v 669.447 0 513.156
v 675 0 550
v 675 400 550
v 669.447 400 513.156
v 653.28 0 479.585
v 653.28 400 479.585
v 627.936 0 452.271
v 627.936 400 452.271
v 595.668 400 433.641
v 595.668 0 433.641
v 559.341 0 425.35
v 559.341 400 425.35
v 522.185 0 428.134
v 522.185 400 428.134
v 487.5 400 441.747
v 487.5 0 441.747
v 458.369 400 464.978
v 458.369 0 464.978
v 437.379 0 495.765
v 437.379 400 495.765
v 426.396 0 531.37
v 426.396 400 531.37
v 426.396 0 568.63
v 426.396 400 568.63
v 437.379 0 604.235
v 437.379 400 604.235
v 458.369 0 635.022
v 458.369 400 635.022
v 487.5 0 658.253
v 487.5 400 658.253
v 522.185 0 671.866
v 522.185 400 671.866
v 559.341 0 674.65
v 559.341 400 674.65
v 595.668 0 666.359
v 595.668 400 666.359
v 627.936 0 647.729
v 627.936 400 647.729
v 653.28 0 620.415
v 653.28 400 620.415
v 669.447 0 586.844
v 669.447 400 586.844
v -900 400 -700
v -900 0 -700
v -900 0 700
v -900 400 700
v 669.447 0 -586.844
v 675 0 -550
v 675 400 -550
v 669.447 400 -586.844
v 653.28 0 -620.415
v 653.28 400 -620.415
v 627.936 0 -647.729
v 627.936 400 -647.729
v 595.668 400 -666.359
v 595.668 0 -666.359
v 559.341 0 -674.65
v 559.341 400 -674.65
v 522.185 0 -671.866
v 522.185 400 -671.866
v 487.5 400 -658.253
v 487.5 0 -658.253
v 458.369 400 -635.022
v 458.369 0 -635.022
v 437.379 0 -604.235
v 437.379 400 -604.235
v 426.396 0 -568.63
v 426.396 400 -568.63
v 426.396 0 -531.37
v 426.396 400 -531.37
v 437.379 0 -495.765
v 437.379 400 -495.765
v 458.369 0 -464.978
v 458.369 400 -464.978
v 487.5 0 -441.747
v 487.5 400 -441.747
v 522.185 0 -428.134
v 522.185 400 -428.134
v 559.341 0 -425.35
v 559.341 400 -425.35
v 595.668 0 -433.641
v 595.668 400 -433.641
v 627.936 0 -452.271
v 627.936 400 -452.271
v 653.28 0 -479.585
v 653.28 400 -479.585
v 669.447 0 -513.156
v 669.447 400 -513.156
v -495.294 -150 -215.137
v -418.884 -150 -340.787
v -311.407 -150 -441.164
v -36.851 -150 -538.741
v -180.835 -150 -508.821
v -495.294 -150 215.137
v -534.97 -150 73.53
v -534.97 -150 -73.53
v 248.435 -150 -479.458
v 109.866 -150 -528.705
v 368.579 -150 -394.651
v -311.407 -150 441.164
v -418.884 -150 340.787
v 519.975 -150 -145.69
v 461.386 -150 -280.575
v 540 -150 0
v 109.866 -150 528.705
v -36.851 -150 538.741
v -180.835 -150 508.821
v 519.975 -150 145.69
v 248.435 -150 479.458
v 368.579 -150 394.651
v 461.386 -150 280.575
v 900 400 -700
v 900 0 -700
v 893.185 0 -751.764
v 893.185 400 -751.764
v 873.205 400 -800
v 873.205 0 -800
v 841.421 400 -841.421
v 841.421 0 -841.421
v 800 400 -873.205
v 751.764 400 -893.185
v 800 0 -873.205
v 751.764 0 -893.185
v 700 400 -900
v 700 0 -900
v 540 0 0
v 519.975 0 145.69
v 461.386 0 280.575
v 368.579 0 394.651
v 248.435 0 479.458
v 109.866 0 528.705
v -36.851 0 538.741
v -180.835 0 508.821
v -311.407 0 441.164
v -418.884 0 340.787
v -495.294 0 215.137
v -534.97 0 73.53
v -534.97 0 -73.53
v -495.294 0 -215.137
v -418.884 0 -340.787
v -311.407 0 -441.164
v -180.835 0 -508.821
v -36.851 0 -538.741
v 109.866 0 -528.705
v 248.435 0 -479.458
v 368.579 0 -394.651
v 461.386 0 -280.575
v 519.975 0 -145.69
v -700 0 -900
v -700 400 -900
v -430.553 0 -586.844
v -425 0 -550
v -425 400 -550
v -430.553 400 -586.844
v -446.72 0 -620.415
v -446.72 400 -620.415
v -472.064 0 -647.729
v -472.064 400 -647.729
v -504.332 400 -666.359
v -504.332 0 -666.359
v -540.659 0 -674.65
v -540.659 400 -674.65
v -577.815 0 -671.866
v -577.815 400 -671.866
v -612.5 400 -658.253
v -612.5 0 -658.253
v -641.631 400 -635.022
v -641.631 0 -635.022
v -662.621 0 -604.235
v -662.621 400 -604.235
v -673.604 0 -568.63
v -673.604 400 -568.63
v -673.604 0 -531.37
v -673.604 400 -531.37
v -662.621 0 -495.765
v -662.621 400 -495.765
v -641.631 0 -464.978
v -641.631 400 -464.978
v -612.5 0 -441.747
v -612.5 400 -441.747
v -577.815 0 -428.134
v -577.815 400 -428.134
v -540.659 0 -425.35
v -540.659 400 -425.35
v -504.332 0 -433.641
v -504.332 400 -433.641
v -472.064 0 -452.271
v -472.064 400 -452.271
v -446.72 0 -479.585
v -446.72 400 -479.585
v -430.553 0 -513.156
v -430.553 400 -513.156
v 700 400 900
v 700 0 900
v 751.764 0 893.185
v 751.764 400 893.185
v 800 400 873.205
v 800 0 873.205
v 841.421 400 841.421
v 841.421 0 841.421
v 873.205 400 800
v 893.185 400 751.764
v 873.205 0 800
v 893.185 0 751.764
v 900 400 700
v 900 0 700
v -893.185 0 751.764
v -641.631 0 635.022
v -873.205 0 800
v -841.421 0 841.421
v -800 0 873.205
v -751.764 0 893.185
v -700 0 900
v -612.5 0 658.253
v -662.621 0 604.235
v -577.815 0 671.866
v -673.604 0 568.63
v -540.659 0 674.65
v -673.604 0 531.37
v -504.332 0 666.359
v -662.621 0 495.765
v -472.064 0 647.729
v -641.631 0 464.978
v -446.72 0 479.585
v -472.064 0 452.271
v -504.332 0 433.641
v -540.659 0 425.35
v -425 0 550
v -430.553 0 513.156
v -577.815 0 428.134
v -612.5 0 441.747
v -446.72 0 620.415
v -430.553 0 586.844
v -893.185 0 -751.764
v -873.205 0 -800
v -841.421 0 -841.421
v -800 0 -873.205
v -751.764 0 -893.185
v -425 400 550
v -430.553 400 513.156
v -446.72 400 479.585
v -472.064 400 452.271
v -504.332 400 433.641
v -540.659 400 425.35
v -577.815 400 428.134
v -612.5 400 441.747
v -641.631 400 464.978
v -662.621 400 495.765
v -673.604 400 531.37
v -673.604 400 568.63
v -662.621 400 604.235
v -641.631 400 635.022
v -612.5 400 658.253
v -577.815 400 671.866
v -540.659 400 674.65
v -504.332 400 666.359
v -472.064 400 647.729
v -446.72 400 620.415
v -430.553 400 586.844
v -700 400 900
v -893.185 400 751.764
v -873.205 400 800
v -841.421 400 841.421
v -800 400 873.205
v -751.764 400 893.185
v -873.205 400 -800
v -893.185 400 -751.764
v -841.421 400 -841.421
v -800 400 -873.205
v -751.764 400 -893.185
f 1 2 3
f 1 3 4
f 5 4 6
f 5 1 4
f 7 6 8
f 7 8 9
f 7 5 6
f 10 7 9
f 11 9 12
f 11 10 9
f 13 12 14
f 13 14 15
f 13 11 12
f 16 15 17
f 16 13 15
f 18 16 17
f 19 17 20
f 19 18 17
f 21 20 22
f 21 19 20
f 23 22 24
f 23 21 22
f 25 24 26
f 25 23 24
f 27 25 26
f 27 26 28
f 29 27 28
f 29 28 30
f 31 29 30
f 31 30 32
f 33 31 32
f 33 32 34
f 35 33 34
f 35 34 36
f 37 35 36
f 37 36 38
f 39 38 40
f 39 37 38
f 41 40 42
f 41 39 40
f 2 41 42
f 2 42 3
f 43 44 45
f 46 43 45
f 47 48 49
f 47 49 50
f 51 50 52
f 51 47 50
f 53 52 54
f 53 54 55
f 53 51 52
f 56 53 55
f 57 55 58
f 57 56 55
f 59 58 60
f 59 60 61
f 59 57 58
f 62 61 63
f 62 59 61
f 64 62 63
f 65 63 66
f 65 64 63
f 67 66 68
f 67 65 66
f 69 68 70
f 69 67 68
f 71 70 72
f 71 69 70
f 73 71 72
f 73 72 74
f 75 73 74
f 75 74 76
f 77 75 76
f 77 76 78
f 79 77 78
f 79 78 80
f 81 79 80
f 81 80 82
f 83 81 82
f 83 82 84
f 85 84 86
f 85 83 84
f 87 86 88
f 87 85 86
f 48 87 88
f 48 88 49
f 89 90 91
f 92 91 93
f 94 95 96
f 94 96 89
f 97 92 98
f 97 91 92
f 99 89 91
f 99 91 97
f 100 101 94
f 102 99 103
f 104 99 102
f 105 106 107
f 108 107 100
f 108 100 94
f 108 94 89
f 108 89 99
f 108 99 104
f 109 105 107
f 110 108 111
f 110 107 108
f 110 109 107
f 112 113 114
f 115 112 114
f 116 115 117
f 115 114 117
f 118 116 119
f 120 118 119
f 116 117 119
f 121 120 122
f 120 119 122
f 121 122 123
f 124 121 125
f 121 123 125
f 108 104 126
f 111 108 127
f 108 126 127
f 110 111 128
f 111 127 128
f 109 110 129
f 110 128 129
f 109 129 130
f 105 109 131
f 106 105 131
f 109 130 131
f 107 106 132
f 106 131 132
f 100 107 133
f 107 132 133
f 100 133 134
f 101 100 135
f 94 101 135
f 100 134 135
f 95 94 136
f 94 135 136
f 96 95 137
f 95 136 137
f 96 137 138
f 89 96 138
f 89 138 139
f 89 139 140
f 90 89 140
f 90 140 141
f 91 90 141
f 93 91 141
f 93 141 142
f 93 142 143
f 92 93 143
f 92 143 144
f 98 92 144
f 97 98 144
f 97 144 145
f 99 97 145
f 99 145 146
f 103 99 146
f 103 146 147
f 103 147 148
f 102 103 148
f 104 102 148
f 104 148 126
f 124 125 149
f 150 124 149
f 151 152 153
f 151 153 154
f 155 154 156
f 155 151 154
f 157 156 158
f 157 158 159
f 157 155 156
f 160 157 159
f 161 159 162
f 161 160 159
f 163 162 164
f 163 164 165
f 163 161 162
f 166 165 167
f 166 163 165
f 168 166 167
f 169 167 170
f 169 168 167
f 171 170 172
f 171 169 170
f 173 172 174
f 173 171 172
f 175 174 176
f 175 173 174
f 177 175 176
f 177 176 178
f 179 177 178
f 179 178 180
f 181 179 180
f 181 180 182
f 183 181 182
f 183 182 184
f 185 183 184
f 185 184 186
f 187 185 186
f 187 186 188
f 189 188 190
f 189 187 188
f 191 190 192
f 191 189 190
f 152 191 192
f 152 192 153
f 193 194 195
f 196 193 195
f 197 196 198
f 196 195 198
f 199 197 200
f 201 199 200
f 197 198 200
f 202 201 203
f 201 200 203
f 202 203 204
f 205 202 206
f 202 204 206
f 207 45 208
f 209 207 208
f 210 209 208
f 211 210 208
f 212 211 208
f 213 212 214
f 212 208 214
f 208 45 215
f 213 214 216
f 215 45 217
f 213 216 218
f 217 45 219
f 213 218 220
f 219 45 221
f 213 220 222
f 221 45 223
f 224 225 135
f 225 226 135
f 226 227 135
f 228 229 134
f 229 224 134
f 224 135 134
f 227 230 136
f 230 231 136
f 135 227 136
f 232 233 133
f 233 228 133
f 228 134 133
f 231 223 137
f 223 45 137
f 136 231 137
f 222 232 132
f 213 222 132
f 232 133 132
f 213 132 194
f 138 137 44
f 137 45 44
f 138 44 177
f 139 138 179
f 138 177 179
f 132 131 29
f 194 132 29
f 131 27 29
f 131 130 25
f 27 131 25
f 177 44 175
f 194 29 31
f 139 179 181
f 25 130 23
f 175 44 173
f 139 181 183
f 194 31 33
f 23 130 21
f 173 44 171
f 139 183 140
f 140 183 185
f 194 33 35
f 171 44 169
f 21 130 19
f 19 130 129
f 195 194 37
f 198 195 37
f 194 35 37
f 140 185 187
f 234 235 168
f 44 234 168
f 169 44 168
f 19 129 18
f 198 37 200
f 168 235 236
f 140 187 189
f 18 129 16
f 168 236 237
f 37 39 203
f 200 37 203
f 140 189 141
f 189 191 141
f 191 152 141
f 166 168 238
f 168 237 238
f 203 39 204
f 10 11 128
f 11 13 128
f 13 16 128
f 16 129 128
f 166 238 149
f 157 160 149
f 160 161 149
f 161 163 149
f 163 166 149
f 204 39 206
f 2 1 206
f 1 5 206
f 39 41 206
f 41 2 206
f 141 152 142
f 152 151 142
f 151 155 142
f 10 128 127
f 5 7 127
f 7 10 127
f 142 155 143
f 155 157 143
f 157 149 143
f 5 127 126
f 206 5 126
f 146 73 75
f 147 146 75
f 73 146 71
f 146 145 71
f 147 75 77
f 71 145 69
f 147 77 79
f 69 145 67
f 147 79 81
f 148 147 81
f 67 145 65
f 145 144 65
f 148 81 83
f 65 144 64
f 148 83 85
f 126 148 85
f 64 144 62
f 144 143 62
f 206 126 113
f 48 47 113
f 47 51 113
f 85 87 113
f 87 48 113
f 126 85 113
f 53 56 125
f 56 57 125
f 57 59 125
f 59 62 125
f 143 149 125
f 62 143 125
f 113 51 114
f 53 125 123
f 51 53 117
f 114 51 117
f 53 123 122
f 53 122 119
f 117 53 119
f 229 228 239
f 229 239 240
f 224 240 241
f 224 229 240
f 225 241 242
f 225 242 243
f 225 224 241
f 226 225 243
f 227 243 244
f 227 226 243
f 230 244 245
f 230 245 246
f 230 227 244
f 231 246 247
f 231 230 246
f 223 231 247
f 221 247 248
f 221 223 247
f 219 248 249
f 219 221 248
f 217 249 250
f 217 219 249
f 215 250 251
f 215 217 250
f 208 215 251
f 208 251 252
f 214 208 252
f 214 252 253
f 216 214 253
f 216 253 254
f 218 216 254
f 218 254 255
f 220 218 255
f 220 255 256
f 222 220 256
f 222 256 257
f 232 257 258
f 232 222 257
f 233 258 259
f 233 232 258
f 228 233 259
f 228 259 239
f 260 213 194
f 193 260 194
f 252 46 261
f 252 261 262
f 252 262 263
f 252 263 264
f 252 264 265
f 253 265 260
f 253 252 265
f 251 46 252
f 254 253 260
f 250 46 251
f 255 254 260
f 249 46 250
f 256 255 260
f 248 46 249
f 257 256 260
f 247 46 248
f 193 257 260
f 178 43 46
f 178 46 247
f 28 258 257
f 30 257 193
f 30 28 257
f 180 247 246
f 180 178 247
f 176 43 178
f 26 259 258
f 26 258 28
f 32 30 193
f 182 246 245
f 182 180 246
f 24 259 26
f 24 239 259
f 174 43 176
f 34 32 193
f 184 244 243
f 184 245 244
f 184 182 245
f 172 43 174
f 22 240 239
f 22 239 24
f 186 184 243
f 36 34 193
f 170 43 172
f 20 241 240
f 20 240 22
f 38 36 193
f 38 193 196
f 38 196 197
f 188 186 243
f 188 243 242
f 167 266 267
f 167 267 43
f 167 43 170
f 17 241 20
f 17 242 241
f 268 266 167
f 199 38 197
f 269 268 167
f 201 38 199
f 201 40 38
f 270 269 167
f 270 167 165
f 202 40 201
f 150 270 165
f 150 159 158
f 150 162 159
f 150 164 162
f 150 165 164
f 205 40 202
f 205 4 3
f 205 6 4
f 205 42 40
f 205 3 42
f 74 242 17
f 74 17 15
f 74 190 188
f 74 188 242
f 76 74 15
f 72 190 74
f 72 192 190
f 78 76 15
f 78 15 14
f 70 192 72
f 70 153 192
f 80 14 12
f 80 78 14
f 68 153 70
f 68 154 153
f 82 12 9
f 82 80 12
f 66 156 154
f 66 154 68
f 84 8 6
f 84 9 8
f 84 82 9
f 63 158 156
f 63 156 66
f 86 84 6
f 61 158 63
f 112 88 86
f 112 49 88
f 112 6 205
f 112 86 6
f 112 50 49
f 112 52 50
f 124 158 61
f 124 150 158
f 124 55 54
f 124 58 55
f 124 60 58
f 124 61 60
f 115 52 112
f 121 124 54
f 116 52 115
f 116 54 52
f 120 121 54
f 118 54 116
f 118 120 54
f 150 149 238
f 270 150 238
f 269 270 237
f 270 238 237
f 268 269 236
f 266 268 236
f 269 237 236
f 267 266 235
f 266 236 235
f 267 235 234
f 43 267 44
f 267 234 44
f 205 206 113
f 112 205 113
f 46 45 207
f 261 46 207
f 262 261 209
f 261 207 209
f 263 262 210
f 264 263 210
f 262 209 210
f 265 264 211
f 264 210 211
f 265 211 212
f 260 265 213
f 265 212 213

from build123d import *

# Parameters (mm, degrees)
IZIM1_R                     = 125
Y_KSEKLIK_EKSTR_ZYON2_DEPTH = 400
IZIM2_R                     = 530
KES_EKSTR_ZYON1_DEPTH       = 150
IZIM3_R                     = 540
Y_KSEKLIK_EKSTR_ZYON3_DEPTH = 300


with BuildPart() as part:
    # Çizim1 → Yükseklik-Ekstrüzyon2 (new body)
    with BuildSketch(Plane(origin=(0, 0, 0), x_dir=(1, 0, 0), z_dir=(0, 1, 0))):
        with BuildLine():
            Line((-900, 700), (-900, -700))
            ThreePointArc((-900, -700), (-841.421356237, -841.421356237), (-700, -900))
            Line((-700, -900), (700, -900))
            ThreePointArc((700, -900), (841.421356237, -841.421356237), (900, -700))
            Line((900, -700), (900, 700))
            ThreePointArc((900, 700), (841.421356237, 841.421356237), (700, 900))
            Line((700, 900), (-700, 900))
            ThreePointArc((-700, 900), (-841.421356237, 841.421356237), (-900, 700))
        make_face()
        with Locations((-550, 550)):
            Circle(IZIM1_R, mode=Mode.SUBTRACT)
        with Locations((550, 550)):
            Circle(IZIM1_R, mode=Mode.SUBTRACT)
        with Locations((-550, -550)):
            Circle(IZIM1_R, mode=Mode.SUBTRACT)
        with Locations((550, -550)):
            Circle(IZIM1_R, mode=Mode.SUBTRACT)
    extrude(amount=Y_KSEKLIK_EKSTR_ZYON2_DEPTH)

    # Çizim2 → Kes-Ekstrüzyon1 (cut)
    with BuildSketch(Plane.XZ):
        Circle(IZIM2_R)
    extrude(amount=-KES_EKSTR_ZYON1_DEPTH, mode=Mode.SUBTRACT)

    # Çizim3 → Yükseklik-Ekstrüzyon3 (add)
    with BuildSketch(Plane.XZ.offset(-150)):
        Circle(IZIM3_R)
    extrude(amount=Y_KSEKLIK_EKSTR_ZYON3_DEPTH)


solid = part.part
